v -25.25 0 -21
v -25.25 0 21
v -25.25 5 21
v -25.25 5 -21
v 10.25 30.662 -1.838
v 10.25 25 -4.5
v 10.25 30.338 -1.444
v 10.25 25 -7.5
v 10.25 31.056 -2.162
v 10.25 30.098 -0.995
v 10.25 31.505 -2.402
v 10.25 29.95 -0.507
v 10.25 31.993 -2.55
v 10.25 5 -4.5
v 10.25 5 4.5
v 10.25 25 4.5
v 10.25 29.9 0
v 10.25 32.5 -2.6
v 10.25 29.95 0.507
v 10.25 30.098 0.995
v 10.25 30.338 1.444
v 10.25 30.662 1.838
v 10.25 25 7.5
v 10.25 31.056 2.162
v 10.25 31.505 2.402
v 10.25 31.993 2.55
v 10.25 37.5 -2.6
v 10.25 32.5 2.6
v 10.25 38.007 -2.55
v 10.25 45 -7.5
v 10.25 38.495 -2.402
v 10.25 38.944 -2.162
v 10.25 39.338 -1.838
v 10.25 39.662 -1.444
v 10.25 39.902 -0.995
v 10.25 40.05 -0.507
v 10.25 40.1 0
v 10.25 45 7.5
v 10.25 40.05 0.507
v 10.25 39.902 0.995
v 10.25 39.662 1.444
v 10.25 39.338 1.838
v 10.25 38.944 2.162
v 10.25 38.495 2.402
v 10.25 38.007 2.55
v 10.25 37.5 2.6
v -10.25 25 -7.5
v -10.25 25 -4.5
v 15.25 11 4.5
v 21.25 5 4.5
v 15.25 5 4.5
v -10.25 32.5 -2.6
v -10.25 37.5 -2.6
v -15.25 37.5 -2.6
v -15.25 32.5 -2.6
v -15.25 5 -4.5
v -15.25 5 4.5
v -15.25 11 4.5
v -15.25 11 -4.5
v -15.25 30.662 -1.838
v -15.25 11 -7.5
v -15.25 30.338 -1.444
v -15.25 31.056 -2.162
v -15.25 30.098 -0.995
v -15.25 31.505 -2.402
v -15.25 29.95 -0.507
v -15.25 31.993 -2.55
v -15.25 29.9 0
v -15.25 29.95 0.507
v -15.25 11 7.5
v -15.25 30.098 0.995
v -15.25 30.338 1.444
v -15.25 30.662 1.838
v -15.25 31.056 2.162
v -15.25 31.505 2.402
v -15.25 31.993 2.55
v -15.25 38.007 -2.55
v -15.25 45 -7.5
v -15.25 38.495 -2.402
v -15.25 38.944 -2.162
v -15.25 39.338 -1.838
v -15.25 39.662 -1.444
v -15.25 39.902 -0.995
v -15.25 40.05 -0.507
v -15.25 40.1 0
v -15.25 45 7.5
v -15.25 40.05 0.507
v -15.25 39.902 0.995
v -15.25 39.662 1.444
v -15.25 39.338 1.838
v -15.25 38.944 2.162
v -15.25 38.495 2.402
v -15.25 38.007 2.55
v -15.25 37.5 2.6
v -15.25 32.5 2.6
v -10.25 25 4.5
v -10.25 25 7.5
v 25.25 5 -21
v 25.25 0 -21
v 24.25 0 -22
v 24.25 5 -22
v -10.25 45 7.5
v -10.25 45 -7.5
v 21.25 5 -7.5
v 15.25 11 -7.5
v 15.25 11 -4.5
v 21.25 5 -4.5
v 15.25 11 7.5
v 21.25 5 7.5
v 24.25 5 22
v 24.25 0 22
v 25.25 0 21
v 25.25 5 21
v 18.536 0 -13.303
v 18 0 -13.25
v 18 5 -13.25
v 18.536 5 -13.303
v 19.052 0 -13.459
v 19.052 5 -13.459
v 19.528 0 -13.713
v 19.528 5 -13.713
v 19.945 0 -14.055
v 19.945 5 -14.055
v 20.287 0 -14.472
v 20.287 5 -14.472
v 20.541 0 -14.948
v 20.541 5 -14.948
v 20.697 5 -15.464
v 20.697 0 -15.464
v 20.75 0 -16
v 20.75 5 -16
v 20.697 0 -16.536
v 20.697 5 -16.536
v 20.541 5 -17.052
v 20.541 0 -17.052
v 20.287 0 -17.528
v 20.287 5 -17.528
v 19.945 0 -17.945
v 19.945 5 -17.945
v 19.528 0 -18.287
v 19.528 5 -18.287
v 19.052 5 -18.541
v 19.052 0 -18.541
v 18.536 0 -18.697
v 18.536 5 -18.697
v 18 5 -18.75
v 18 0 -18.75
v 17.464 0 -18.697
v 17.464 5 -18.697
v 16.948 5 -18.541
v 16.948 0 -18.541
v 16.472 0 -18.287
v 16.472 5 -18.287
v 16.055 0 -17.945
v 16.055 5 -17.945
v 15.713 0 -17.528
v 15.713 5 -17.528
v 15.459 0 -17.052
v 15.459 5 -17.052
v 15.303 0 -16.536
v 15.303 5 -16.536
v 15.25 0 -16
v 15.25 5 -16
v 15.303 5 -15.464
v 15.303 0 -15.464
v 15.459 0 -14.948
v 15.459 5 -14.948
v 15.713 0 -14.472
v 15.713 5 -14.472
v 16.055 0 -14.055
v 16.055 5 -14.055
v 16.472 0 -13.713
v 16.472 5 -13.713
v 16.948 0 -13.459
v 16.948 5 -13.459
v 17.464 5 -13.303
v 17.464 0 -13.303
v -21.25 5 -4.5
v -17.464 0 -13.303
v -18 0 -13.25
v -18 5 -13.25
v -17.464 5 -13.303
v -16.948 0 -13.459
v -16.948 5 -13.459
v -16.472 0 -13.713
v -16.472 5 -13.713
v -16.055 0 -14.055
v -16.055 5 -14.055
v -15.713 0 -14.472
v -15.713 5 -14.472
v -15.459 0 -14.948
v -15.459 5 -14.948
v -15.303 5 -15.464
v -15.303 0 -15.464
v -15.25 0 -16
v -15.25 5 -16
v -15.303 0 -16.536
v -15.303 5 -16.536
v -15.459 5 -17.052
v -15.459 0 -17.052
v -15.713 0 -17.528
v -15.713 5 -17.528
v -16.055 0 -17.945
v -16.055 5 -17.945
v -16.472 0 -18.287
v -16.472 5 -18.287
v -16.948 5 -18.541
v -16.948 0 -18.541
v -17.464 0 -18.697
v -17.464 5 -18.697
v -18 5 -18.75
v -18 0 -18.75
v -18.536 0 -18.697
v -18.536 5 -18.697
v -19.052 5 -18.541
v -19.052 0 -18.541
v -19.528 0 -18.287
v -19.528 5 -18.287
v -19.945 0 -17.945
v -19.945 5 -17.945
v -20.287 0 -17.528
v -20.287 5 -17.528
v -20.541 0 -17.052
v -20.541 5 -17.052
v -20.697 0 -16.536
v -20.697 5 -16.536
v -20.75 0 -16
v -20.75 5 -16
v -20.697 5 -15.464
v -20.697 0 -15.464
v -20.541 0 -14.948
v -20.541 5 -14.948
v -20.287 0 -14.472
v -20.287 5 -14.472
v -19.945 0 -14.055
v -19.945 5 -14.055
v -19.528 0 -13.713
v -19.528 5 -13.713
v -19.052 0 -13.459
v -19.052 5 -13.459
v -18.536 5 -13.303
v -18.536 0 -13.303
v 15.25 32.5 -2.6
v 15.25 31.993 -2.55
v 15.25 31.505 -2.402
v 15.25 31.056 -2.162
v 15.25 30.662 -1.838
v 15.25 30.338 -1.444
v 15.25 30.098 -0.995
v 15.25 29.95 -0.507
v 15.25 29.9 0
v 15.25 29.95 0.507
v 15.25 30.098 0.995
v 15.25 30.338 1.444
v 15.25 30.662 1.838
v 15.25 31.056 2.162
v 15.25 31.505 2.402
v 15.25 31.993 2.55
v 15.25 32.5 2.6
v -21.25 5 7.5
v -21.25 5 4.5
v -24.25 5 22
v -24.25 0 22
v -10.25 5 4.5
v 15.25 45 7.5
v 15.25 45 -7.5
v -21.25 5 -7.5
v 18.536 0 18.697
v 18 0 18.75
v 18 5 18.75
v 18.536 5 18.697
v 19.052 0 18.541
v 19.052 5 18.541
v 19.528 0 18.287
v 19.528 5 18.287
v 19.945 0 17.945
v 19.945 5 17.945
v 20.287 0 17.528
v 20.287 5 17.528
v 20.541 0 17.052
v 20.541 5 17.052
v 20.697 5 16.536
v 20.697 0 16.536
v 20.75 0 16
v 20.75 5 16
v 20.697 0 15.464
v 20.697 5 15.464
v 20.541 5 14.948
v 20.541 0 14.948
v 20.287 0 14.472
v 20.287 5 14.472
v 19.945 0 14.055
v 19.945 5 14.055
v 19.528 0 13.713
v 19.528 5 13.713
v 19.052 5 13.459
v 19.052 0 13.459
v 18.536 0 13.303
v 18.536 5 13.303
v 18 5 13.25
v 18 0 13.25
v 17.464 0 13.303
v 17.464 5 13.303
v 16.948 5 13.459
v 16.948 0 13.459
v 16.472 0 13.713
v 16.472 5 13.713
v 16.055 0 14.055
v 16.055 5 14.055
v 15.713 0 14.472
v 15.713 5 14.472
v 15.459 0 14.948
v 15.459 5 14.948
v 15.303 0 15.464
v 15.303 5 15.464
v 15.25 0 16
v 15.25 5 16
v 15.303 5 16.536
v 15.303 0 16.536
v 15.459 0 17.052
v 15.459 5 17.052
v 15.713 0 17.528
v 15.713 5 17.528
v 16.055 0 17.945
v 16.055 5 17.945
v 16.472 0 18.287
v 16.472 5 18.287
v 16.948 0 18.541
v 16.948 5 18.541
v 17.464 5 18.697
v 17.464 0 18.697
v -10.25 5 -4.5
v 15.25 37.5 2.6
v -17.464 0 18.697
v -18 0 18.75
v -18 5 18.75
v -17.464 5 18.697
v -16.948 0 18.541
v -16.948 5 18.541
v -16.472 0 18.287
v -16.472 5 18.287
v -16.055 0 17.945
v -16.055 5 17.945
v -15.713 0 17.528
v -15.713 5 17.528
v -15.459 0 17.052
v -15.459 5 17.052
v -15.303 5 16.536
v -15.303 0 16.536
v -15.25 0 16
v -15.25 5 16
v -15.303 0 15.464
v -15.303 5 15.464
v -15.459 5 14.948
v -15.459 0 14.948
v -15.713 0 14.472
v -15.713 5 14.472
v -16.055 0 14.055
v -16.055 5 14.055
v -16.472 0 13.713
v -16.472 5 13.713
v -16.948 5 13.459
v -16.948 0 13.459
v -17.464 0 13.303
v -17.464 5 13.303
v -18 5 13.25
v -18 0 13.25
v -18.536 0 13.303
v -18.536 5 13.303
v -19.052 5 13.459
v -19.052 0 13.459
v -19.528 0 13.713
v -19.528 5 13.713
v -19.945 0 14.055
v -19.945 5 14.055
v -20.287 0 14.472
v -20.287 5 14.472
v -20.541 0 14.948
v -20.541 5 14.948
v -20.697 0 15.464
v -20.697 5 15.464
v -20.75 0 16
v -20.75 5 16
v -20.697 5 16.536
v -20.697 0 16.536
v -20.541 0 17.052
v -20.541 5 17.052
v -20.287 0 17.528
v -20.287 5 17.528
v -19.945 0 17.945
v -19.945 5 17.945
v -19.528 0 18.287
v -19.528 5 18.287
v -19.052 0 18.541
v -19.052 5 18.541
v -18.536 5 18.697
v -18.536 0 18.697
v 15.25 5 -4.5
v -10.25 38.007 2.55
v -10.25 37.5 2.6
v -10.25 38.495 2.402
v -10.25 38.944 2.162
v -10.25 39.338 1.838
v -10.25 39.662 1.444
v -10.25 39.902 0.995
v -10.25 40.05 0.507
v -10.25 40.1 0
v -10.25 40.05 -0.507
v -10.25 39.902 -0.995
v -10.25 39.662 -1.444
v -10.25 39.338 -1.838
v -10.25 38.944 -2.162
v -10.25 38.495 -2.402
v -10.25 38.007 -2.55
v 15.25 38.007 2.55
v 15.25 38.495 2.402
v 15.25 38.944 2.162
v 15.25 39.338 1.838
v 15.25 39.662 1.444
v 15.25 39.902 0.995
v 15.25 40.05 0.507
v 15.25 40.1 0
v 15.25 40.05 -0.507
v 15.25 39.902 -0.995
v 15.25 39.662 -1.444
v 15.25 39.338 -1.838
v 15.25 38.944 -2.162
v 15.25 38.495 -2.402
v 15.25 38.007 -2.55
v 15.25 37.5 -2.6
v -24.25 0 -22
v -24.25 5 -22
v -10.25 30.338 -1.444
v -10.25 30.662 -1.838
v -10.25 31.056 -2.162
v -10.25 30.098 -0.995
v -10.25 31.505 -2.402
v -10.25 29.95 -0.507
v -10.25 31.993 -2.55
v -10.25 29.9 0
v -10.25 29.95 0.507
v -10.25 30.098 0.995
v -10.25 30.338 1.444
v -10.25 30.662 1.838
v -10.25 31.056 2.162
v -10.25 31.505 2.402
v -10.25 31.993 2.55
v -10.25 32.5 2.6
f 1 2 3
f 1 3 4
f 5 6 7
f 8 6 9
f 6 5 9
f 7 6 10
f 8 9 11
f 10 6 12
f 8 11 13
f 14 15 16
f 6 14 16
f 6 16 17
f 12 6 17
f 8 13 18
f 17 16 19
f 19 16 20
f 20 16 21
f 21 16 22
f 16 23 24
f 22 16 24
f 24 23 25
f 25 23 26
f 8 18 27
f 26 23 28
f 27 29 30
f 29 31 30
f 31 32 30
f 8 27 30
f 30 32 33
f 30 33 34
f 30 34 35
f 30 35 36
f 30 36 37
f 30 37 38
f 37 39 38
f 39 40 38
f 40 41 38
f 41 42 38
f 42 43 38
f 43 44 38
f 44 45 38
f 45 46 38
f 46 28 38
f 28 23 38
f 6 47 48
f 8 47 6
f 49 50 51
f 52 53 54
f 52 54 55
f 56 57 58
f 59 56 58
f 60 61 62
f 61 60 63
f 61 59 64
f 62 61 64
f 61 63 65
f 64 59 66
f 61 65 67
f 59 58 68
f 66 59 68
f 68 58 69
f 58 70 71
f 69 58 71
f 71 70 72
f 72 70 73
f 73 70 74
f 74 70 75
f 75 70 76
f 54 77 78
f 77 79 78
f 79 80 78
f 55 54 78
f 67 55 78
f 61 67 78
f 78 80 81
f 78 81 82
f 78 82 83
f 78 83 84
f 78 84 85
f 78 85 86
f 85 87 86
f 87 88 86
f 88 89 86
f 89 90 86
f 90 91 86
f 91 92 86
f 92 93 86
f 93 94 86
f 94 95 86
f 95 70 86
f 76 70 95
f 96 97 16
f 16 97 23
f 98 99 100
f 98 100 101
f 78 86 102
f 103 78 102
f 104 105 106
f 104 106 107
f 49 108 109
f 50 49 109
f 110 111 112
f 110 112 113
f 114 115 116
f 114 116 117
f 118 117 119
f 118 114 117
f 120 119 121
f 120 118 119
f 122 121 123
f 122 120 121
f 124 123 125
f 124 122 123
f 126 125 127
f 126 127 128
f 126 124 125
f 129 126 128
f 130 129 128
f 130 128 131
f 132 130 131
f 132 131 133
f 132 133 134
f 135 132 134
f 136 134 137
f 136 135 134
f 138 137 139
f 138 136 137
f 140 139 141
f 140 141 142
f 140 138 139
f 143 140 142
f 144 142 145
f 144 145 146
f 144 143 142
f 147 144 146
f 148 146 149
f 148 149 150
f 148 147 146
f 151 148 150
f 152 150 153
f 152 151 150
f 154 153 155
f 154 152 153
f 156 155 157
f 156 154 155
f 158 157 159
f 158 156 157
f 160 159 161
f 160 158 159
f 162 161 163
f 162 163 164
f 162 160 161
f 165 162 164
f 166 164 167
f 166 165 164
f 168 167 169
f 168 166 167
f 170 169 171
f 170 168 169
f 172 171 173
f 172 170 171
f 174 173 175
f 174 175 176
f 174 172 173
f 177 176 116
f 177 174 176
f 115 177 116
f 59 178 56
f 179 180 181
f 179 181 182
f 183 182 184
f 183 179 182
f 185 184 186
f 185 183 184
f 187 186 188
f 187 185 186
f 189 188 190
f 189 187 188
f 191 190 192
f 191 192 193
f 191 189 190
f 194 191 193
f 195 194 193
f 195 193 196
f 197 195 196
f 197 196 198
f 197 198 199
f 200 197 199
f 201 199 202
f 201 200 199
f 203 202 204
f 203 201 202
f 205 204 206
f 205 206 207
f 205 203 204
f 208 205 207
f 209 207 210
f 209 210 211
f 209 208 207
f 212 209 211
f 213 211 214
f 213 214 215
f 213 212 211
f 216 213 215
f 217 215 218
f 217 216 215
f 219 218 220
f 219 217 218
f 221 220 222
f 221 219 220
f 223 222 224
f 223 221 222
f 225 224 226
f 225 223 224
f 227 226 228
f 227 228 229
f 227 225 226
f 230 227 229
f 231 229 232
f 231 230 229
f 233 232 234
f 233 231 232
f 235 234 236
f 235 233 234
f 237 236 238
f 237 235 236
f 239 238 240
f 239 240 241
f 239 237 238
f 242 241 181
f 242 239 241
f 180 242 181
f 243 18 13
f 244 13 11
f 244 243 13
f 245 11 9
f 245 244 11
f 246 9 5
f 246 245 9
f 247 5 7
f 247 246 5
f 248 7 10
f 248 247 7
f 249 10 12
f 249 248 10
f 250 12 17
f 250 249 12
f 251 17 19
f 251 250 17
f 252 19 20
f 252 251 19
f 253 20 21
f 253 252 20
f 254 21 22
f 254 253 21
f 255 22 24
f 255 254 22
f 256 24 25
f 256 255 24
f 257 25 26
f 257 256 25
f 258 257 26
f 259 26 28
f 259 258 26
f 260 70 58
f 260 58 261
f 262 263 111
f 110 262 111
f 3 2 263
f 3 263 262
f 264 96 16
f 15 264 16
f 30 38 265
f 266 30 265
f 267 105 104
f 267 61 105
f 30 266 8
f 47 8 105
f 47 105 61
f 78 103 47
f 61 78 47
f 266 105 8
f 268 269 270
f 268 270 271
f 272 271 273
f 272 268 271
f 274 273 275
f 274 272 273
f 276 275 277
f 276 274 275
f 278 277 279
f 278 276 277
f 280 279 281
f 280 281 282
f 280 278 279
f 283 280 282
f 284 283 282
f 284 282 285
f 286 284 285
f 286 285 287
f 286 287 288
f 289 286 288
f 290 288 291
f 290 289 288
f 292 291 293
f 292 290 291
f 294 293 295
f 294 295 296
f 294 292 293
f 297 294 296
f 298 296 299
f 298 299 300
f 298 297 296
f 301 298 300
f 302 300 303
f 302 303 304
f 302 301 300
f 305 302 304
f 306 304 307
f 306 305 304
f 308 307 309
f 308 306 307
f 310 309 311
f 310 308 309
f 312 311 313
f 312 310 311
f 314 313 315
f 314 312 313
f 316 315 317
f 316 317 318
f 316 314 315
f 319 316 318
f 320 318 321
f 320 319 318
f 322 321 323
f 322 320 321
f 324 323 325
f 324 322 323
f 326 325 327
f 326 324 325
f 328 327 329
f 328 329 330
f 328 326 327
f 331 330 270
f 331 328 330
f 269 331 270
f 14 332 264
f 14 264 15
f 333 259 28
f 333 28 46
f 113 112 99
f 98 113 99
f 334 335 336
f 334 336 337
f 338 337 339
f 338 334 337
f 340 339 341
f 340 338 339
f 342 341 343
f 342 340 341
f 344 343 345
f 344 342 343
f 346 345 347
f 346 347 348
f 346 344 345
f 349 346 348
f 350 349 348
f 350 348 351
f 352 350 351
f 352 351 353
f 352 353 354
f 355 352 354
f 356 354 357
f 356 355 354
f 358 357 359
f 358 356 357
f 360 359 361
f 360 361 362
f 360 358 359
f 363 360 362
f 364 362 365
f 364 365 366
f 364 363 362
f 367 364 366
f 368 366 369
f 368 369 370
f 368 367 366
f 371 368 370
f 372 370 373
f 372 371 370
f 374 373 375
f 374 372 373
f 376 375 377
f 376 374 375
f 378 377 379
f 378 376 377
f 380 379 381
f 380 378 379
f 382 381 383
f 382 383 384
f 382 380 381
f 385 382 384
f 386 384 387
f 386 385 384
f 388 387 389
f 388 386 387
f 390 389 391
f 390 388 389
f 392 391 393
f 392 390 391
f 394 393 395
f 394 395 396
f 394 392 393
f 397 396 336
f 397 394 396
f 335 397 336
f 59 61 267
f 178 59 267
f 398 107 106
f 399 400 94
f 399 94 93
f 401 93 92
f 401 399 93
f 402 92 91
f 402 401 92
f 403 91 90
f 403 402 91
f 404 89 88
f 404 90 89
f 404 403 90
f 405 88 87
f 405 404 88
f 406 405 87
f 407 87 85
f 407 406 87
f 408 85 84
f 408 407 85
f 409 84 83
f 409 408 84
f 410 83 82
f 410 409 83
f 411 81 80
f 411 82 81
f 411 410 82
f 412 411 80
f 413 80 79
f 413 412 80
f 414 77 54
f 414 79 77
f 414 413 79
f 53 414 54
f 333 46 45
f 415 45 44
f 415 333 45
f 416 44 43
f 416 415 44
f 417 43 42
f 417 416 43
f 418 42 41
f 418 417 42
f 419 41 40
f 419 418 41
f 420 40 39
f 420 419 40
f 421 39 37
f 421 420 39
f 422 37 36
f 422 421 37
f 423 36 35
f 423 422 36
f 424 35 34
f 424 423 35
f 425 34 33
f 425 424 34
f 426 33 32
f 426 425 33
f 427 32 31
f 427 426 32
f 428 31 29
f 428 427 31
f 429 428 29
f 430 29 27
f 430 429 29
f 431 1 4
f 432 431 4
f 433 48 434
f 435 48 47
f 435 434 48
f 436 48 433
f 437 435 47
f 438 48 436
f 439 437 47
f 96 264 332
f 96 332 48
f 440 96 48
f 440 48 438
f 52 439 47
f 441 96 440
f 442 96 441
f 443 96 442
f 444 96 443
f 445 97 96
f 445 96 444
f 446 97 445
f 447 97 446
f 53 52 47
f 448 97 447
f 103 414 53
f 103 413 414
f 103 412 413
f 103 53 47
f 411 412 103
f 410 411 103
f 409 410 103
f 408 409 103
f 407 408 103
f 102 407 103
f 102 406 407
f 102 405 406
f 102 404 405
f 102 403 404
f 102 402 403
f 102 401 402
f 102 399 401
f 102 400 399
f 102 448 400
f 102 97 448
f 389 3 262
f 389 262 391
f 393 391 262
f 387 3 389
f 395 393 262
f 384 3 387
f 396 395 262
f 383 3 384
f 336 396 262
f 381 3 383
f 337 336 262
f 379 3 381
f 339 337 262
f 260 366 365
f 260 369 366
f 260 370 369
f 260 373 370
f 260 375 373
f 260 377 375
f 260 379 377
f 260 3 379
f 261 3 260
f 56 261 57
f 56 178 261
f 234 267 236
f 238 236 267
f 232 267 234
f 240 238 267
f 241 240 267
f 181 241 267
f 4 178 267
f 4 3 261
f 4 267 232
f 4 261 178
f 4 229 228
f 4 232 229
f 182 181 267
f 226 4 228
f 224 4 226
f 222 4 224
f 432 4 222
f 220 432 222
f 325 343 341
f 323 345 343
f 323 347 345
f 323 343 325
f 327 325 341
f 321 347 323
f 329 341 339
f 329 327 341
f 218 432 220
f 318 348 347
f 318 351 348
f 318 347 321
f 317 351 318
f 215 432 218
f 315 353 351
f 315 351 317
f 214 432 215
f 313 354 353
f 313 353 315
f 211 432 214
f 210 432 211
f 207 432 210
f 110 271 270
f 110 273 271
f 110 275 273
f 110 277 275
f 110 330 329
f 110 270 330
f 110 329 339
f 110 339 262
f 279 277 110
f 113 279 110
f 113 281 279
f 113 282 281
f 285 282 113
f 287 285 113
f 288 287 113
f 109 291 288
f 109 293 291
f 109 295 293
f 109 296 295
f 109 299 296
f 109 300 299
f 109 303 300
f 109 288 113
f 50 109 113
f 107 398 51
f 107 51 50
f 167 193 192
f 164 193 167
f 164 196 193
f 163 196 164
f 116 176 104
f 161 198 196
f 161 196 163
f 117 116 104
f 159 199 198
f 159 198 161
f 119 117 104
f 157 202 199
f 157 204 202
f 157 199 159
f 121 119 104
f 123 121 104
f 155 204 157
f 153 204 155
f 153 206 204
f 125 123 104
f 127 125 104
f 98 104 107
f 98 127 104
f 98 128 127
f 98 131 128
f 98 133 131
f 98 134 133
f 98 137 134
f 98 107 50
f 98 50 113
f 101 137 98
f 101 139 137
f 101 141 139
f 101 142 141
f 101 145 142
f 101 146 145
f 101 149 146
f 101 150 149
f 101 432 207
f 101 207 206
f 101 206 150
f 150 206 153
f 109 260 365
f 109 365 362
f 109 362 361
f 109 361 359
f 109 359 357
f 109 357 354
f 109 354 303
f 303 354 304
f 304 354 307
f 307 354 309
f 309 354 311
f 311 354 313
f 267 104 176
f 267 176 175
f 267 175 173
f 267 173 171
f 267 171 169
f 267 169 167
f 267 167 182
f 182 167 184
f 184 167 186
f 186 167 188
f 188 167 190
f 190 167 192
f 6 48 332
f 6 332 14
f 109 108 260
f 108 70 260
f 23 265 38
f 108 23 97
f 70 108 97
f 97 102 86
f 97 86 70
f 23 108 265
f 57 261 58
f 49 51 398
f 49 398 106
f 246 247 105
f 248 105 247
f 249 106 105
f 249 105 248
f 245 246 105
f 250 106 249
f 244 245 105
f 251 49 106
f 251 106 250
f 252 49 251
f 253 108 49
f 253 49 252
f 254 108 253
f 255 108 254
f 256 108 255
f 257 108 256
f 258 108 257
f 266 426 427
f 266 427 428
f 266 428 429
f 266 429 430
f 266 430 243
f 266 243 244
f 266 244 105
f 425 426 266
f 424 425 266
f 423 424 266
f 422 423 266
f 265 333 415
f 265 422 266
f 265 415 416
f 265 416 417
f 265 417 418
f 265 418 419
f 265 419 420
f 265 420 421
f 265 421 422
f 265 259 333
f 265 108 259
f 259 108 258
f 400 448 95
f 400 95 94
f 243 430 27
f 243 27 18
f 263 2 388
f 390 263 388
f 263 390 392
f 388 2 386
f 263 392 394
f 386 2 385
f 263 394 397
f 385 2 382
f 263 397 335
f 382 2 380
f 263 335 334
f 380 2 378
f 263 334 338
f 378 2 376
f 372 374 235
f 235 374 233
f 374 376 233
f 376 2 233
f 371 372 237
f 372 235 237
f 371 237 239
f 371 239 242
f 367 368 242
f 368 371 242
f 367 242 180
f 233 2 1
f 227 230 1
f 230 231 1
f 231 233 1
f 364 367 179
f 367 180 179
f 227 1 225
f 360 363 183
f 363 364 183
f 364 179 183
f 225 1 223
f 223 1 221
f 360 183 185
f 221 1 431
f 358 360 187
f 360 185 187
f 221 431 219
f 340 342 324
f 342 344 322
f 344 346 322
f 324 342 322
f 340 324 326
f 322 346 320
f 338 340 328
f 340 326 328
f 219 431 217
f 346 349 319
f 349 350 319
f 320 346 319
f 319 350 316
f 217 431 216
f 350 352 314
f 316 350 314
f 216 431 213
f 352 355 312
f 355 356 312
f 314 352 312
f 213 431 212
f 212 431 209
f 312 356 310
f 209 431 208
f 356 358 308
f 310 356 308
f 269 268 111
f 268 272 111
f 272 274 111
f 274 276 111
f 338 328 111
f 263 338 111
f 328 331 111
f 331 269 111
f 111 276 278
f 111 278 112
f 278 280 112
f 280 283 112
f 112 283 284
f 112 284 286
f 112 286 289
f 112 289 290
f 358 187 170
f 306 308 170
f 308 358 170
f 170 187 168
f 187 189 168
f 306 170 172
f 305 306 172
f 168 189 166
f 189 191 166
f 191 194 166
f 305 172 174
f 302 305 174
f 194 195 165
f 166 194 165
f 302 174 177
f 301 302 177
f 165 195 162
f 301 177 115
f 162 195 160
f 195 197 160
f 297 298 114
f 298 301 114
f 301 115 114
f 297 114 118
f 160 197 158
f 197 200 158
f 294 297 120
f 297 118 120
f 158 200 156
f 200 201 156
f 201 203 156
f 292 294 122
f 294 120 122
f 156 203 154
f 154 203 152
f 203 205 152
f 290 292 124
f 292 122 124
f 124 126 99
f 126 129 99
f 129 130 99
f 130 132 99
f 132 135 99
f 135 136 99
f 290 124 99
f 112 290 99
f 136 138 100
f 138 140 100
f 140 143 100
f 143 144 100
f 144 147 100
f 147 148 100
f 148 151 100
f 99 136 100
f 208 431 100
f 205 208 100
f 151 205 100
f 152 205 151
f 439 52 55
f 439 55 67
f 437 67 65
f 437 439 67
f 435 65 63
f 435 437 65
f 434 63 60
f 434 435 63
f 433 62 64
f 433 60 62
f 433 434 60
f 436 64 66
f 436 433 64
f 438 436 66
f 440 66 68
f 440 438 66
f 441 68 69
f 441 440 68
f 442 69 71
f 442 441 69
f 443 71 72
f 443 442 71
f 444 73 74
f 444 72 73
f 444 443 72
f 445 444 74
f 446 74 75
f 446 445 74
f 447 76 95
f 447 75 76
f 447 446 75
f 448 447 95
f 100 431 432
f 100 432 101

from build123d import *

# Parameters (mm, degrees)
SKETCH1_W           = 50.5
SKETCH1_H           = 44
SKETCH1_R           = 2.75
BOSS_EXTRUDE1_DEPTH = 5
BOSS_EXTRUDE2_START = -14.5
SKETCH3_W           = 5
SKETCH3_H           = 40
BOSS_EXTRUDE2_DEPTH = 15
CUT_EXTRUDE1_REACH  = 66.415
SKETCH5_W           = 20.5
SKETCH5_H           = 20
BOSS_EXTRUDE3_DEPTH = 3
CHAMFER2_SIZE       = 1


with BuildPart() as part:
    # Sketch1 → Boss-Extrude1 (new body)
    with BuildSketch(Plane(origin=(0, 0, 0), x_dir=(1, 0, 0), z_dir=(0, 1, 0))):
        Rectangle(SKETCH1_W, SKETCH1_H)
        with Locations(Location((-18, 16, 0), (0, 0, 270))):
            Circle(SKETCH1_R, mode=Mode.SUBTRACT)
        with Locations(Location((18, 16, 0), (0, 0, 270))):
            Circle(SKETCH1_R, mode=Mode.SUBTRACT)
        with Locations(Location((18, -16, 0), (0, 0, 270))):
            Circle(SKETCH1_R, mode=Mode.SUBTRACT)
        with Locations(Location((-18, -16, 0), (0, 0, 270))):
            Circle(SKETCH1_R, mode=Mode.SUBTRACT)
    extrude(amount=BOSS_EXTRUDE1_DEPTH)

    # Sketch3 → Boss-Extrude2 (add)
    with BuildSketch(Plane.XY.offset(22).offset(BOSS_EXTRUDE2_START)):
        with Locations((-12.75, 25)):
            Rectangle(SKETCH3_W, SKETCH3_H)
        with Locations((12.75, 25)):
            Rectangle(SKETCH3_W, SKETCH3_H)
    extrude(amount=-BOSS_EXTRUDE2_DEPTH)

    # Cut-Extrude1: up to this face of the body (flat: up to its plane)
    cut_extrude1_end = Plane(part.part.faces().sort_by_distance((-15.25, 25, 0))[0])
    # Sketch4 → Cut-Extrude1 (cut, up to the picked face)
    with BuildSketch(Plane(origin=(15.25, 0, 0), x_dir=(0, 0, -1), z_dir=(1, 0, 0)), mode=Mode.PRIVATE) as cut_extrude1_sk1:
        with BuildLine():
            Line((2.6, 37.5), (2.6, 32.5))
            ThreePointArc((2.6, 32.5), (0, 29.9), (-2.6, 32.5))
            Line((-2.6, 32.5), (-2.6, 37.5))
            ThreePointArc((-2.6, 37.5), (0, 40.1), (2.6, 37.5))
        make_face()
    cut_extrude1_tool1 = split(extrude(cut_extrude1_sk1.sketch, amount=-CUT_EXTRUDE1_REACH, mode=Mode.PRIVATE), bisect_by=cut_extrude1_end, keep=Keep.BOTH, mode=Mode.PRIVATE)
    add(cut_extrude1_tool1.solids().sort_by(Axis((15.25, 35, 0), (-1, 0, 0)))[0], mode=Mode.SUBTRACT)

    # Sketch5 → Boss-Extrude3 (add)
    with BuildSketch(Plane.XY.offset(7.5)):
        Polygon((15.25, 11), (21.25, 5), (15.25, 5), align=None)
        Polygon((-21.25, 5), (-15.25, 5), (-15.25, 11), align=None)
        with Locations((0, 15)):
            Rectangle(SKETCH5_W, SKETCH5_H)
    boss_extrude3 = extrude(amount=-BOSS_EXTRUDE3_DEPTH)

    # Mirror1: Boss-Extrude3 across plane
    add(boss_extrude3.mirror(Plane(origin=(0, 0, 0), x_dir=(1, 0, 0), z_dir=(0, 0, -1))))

    # Chamfer2
    chamfer2_edges = [part.edges().sort_by_distance(p)[0] for p in [
        (25.25, 2.5, 22),
        (-25.25, 2.5, 22),
        (-25.25, 2.5, -22),
        (25.25, 2.5, -22),
    ]]
    chamfer(chamfer2_edges, length=CHAMFER2_SIZE)


solid = part.part
